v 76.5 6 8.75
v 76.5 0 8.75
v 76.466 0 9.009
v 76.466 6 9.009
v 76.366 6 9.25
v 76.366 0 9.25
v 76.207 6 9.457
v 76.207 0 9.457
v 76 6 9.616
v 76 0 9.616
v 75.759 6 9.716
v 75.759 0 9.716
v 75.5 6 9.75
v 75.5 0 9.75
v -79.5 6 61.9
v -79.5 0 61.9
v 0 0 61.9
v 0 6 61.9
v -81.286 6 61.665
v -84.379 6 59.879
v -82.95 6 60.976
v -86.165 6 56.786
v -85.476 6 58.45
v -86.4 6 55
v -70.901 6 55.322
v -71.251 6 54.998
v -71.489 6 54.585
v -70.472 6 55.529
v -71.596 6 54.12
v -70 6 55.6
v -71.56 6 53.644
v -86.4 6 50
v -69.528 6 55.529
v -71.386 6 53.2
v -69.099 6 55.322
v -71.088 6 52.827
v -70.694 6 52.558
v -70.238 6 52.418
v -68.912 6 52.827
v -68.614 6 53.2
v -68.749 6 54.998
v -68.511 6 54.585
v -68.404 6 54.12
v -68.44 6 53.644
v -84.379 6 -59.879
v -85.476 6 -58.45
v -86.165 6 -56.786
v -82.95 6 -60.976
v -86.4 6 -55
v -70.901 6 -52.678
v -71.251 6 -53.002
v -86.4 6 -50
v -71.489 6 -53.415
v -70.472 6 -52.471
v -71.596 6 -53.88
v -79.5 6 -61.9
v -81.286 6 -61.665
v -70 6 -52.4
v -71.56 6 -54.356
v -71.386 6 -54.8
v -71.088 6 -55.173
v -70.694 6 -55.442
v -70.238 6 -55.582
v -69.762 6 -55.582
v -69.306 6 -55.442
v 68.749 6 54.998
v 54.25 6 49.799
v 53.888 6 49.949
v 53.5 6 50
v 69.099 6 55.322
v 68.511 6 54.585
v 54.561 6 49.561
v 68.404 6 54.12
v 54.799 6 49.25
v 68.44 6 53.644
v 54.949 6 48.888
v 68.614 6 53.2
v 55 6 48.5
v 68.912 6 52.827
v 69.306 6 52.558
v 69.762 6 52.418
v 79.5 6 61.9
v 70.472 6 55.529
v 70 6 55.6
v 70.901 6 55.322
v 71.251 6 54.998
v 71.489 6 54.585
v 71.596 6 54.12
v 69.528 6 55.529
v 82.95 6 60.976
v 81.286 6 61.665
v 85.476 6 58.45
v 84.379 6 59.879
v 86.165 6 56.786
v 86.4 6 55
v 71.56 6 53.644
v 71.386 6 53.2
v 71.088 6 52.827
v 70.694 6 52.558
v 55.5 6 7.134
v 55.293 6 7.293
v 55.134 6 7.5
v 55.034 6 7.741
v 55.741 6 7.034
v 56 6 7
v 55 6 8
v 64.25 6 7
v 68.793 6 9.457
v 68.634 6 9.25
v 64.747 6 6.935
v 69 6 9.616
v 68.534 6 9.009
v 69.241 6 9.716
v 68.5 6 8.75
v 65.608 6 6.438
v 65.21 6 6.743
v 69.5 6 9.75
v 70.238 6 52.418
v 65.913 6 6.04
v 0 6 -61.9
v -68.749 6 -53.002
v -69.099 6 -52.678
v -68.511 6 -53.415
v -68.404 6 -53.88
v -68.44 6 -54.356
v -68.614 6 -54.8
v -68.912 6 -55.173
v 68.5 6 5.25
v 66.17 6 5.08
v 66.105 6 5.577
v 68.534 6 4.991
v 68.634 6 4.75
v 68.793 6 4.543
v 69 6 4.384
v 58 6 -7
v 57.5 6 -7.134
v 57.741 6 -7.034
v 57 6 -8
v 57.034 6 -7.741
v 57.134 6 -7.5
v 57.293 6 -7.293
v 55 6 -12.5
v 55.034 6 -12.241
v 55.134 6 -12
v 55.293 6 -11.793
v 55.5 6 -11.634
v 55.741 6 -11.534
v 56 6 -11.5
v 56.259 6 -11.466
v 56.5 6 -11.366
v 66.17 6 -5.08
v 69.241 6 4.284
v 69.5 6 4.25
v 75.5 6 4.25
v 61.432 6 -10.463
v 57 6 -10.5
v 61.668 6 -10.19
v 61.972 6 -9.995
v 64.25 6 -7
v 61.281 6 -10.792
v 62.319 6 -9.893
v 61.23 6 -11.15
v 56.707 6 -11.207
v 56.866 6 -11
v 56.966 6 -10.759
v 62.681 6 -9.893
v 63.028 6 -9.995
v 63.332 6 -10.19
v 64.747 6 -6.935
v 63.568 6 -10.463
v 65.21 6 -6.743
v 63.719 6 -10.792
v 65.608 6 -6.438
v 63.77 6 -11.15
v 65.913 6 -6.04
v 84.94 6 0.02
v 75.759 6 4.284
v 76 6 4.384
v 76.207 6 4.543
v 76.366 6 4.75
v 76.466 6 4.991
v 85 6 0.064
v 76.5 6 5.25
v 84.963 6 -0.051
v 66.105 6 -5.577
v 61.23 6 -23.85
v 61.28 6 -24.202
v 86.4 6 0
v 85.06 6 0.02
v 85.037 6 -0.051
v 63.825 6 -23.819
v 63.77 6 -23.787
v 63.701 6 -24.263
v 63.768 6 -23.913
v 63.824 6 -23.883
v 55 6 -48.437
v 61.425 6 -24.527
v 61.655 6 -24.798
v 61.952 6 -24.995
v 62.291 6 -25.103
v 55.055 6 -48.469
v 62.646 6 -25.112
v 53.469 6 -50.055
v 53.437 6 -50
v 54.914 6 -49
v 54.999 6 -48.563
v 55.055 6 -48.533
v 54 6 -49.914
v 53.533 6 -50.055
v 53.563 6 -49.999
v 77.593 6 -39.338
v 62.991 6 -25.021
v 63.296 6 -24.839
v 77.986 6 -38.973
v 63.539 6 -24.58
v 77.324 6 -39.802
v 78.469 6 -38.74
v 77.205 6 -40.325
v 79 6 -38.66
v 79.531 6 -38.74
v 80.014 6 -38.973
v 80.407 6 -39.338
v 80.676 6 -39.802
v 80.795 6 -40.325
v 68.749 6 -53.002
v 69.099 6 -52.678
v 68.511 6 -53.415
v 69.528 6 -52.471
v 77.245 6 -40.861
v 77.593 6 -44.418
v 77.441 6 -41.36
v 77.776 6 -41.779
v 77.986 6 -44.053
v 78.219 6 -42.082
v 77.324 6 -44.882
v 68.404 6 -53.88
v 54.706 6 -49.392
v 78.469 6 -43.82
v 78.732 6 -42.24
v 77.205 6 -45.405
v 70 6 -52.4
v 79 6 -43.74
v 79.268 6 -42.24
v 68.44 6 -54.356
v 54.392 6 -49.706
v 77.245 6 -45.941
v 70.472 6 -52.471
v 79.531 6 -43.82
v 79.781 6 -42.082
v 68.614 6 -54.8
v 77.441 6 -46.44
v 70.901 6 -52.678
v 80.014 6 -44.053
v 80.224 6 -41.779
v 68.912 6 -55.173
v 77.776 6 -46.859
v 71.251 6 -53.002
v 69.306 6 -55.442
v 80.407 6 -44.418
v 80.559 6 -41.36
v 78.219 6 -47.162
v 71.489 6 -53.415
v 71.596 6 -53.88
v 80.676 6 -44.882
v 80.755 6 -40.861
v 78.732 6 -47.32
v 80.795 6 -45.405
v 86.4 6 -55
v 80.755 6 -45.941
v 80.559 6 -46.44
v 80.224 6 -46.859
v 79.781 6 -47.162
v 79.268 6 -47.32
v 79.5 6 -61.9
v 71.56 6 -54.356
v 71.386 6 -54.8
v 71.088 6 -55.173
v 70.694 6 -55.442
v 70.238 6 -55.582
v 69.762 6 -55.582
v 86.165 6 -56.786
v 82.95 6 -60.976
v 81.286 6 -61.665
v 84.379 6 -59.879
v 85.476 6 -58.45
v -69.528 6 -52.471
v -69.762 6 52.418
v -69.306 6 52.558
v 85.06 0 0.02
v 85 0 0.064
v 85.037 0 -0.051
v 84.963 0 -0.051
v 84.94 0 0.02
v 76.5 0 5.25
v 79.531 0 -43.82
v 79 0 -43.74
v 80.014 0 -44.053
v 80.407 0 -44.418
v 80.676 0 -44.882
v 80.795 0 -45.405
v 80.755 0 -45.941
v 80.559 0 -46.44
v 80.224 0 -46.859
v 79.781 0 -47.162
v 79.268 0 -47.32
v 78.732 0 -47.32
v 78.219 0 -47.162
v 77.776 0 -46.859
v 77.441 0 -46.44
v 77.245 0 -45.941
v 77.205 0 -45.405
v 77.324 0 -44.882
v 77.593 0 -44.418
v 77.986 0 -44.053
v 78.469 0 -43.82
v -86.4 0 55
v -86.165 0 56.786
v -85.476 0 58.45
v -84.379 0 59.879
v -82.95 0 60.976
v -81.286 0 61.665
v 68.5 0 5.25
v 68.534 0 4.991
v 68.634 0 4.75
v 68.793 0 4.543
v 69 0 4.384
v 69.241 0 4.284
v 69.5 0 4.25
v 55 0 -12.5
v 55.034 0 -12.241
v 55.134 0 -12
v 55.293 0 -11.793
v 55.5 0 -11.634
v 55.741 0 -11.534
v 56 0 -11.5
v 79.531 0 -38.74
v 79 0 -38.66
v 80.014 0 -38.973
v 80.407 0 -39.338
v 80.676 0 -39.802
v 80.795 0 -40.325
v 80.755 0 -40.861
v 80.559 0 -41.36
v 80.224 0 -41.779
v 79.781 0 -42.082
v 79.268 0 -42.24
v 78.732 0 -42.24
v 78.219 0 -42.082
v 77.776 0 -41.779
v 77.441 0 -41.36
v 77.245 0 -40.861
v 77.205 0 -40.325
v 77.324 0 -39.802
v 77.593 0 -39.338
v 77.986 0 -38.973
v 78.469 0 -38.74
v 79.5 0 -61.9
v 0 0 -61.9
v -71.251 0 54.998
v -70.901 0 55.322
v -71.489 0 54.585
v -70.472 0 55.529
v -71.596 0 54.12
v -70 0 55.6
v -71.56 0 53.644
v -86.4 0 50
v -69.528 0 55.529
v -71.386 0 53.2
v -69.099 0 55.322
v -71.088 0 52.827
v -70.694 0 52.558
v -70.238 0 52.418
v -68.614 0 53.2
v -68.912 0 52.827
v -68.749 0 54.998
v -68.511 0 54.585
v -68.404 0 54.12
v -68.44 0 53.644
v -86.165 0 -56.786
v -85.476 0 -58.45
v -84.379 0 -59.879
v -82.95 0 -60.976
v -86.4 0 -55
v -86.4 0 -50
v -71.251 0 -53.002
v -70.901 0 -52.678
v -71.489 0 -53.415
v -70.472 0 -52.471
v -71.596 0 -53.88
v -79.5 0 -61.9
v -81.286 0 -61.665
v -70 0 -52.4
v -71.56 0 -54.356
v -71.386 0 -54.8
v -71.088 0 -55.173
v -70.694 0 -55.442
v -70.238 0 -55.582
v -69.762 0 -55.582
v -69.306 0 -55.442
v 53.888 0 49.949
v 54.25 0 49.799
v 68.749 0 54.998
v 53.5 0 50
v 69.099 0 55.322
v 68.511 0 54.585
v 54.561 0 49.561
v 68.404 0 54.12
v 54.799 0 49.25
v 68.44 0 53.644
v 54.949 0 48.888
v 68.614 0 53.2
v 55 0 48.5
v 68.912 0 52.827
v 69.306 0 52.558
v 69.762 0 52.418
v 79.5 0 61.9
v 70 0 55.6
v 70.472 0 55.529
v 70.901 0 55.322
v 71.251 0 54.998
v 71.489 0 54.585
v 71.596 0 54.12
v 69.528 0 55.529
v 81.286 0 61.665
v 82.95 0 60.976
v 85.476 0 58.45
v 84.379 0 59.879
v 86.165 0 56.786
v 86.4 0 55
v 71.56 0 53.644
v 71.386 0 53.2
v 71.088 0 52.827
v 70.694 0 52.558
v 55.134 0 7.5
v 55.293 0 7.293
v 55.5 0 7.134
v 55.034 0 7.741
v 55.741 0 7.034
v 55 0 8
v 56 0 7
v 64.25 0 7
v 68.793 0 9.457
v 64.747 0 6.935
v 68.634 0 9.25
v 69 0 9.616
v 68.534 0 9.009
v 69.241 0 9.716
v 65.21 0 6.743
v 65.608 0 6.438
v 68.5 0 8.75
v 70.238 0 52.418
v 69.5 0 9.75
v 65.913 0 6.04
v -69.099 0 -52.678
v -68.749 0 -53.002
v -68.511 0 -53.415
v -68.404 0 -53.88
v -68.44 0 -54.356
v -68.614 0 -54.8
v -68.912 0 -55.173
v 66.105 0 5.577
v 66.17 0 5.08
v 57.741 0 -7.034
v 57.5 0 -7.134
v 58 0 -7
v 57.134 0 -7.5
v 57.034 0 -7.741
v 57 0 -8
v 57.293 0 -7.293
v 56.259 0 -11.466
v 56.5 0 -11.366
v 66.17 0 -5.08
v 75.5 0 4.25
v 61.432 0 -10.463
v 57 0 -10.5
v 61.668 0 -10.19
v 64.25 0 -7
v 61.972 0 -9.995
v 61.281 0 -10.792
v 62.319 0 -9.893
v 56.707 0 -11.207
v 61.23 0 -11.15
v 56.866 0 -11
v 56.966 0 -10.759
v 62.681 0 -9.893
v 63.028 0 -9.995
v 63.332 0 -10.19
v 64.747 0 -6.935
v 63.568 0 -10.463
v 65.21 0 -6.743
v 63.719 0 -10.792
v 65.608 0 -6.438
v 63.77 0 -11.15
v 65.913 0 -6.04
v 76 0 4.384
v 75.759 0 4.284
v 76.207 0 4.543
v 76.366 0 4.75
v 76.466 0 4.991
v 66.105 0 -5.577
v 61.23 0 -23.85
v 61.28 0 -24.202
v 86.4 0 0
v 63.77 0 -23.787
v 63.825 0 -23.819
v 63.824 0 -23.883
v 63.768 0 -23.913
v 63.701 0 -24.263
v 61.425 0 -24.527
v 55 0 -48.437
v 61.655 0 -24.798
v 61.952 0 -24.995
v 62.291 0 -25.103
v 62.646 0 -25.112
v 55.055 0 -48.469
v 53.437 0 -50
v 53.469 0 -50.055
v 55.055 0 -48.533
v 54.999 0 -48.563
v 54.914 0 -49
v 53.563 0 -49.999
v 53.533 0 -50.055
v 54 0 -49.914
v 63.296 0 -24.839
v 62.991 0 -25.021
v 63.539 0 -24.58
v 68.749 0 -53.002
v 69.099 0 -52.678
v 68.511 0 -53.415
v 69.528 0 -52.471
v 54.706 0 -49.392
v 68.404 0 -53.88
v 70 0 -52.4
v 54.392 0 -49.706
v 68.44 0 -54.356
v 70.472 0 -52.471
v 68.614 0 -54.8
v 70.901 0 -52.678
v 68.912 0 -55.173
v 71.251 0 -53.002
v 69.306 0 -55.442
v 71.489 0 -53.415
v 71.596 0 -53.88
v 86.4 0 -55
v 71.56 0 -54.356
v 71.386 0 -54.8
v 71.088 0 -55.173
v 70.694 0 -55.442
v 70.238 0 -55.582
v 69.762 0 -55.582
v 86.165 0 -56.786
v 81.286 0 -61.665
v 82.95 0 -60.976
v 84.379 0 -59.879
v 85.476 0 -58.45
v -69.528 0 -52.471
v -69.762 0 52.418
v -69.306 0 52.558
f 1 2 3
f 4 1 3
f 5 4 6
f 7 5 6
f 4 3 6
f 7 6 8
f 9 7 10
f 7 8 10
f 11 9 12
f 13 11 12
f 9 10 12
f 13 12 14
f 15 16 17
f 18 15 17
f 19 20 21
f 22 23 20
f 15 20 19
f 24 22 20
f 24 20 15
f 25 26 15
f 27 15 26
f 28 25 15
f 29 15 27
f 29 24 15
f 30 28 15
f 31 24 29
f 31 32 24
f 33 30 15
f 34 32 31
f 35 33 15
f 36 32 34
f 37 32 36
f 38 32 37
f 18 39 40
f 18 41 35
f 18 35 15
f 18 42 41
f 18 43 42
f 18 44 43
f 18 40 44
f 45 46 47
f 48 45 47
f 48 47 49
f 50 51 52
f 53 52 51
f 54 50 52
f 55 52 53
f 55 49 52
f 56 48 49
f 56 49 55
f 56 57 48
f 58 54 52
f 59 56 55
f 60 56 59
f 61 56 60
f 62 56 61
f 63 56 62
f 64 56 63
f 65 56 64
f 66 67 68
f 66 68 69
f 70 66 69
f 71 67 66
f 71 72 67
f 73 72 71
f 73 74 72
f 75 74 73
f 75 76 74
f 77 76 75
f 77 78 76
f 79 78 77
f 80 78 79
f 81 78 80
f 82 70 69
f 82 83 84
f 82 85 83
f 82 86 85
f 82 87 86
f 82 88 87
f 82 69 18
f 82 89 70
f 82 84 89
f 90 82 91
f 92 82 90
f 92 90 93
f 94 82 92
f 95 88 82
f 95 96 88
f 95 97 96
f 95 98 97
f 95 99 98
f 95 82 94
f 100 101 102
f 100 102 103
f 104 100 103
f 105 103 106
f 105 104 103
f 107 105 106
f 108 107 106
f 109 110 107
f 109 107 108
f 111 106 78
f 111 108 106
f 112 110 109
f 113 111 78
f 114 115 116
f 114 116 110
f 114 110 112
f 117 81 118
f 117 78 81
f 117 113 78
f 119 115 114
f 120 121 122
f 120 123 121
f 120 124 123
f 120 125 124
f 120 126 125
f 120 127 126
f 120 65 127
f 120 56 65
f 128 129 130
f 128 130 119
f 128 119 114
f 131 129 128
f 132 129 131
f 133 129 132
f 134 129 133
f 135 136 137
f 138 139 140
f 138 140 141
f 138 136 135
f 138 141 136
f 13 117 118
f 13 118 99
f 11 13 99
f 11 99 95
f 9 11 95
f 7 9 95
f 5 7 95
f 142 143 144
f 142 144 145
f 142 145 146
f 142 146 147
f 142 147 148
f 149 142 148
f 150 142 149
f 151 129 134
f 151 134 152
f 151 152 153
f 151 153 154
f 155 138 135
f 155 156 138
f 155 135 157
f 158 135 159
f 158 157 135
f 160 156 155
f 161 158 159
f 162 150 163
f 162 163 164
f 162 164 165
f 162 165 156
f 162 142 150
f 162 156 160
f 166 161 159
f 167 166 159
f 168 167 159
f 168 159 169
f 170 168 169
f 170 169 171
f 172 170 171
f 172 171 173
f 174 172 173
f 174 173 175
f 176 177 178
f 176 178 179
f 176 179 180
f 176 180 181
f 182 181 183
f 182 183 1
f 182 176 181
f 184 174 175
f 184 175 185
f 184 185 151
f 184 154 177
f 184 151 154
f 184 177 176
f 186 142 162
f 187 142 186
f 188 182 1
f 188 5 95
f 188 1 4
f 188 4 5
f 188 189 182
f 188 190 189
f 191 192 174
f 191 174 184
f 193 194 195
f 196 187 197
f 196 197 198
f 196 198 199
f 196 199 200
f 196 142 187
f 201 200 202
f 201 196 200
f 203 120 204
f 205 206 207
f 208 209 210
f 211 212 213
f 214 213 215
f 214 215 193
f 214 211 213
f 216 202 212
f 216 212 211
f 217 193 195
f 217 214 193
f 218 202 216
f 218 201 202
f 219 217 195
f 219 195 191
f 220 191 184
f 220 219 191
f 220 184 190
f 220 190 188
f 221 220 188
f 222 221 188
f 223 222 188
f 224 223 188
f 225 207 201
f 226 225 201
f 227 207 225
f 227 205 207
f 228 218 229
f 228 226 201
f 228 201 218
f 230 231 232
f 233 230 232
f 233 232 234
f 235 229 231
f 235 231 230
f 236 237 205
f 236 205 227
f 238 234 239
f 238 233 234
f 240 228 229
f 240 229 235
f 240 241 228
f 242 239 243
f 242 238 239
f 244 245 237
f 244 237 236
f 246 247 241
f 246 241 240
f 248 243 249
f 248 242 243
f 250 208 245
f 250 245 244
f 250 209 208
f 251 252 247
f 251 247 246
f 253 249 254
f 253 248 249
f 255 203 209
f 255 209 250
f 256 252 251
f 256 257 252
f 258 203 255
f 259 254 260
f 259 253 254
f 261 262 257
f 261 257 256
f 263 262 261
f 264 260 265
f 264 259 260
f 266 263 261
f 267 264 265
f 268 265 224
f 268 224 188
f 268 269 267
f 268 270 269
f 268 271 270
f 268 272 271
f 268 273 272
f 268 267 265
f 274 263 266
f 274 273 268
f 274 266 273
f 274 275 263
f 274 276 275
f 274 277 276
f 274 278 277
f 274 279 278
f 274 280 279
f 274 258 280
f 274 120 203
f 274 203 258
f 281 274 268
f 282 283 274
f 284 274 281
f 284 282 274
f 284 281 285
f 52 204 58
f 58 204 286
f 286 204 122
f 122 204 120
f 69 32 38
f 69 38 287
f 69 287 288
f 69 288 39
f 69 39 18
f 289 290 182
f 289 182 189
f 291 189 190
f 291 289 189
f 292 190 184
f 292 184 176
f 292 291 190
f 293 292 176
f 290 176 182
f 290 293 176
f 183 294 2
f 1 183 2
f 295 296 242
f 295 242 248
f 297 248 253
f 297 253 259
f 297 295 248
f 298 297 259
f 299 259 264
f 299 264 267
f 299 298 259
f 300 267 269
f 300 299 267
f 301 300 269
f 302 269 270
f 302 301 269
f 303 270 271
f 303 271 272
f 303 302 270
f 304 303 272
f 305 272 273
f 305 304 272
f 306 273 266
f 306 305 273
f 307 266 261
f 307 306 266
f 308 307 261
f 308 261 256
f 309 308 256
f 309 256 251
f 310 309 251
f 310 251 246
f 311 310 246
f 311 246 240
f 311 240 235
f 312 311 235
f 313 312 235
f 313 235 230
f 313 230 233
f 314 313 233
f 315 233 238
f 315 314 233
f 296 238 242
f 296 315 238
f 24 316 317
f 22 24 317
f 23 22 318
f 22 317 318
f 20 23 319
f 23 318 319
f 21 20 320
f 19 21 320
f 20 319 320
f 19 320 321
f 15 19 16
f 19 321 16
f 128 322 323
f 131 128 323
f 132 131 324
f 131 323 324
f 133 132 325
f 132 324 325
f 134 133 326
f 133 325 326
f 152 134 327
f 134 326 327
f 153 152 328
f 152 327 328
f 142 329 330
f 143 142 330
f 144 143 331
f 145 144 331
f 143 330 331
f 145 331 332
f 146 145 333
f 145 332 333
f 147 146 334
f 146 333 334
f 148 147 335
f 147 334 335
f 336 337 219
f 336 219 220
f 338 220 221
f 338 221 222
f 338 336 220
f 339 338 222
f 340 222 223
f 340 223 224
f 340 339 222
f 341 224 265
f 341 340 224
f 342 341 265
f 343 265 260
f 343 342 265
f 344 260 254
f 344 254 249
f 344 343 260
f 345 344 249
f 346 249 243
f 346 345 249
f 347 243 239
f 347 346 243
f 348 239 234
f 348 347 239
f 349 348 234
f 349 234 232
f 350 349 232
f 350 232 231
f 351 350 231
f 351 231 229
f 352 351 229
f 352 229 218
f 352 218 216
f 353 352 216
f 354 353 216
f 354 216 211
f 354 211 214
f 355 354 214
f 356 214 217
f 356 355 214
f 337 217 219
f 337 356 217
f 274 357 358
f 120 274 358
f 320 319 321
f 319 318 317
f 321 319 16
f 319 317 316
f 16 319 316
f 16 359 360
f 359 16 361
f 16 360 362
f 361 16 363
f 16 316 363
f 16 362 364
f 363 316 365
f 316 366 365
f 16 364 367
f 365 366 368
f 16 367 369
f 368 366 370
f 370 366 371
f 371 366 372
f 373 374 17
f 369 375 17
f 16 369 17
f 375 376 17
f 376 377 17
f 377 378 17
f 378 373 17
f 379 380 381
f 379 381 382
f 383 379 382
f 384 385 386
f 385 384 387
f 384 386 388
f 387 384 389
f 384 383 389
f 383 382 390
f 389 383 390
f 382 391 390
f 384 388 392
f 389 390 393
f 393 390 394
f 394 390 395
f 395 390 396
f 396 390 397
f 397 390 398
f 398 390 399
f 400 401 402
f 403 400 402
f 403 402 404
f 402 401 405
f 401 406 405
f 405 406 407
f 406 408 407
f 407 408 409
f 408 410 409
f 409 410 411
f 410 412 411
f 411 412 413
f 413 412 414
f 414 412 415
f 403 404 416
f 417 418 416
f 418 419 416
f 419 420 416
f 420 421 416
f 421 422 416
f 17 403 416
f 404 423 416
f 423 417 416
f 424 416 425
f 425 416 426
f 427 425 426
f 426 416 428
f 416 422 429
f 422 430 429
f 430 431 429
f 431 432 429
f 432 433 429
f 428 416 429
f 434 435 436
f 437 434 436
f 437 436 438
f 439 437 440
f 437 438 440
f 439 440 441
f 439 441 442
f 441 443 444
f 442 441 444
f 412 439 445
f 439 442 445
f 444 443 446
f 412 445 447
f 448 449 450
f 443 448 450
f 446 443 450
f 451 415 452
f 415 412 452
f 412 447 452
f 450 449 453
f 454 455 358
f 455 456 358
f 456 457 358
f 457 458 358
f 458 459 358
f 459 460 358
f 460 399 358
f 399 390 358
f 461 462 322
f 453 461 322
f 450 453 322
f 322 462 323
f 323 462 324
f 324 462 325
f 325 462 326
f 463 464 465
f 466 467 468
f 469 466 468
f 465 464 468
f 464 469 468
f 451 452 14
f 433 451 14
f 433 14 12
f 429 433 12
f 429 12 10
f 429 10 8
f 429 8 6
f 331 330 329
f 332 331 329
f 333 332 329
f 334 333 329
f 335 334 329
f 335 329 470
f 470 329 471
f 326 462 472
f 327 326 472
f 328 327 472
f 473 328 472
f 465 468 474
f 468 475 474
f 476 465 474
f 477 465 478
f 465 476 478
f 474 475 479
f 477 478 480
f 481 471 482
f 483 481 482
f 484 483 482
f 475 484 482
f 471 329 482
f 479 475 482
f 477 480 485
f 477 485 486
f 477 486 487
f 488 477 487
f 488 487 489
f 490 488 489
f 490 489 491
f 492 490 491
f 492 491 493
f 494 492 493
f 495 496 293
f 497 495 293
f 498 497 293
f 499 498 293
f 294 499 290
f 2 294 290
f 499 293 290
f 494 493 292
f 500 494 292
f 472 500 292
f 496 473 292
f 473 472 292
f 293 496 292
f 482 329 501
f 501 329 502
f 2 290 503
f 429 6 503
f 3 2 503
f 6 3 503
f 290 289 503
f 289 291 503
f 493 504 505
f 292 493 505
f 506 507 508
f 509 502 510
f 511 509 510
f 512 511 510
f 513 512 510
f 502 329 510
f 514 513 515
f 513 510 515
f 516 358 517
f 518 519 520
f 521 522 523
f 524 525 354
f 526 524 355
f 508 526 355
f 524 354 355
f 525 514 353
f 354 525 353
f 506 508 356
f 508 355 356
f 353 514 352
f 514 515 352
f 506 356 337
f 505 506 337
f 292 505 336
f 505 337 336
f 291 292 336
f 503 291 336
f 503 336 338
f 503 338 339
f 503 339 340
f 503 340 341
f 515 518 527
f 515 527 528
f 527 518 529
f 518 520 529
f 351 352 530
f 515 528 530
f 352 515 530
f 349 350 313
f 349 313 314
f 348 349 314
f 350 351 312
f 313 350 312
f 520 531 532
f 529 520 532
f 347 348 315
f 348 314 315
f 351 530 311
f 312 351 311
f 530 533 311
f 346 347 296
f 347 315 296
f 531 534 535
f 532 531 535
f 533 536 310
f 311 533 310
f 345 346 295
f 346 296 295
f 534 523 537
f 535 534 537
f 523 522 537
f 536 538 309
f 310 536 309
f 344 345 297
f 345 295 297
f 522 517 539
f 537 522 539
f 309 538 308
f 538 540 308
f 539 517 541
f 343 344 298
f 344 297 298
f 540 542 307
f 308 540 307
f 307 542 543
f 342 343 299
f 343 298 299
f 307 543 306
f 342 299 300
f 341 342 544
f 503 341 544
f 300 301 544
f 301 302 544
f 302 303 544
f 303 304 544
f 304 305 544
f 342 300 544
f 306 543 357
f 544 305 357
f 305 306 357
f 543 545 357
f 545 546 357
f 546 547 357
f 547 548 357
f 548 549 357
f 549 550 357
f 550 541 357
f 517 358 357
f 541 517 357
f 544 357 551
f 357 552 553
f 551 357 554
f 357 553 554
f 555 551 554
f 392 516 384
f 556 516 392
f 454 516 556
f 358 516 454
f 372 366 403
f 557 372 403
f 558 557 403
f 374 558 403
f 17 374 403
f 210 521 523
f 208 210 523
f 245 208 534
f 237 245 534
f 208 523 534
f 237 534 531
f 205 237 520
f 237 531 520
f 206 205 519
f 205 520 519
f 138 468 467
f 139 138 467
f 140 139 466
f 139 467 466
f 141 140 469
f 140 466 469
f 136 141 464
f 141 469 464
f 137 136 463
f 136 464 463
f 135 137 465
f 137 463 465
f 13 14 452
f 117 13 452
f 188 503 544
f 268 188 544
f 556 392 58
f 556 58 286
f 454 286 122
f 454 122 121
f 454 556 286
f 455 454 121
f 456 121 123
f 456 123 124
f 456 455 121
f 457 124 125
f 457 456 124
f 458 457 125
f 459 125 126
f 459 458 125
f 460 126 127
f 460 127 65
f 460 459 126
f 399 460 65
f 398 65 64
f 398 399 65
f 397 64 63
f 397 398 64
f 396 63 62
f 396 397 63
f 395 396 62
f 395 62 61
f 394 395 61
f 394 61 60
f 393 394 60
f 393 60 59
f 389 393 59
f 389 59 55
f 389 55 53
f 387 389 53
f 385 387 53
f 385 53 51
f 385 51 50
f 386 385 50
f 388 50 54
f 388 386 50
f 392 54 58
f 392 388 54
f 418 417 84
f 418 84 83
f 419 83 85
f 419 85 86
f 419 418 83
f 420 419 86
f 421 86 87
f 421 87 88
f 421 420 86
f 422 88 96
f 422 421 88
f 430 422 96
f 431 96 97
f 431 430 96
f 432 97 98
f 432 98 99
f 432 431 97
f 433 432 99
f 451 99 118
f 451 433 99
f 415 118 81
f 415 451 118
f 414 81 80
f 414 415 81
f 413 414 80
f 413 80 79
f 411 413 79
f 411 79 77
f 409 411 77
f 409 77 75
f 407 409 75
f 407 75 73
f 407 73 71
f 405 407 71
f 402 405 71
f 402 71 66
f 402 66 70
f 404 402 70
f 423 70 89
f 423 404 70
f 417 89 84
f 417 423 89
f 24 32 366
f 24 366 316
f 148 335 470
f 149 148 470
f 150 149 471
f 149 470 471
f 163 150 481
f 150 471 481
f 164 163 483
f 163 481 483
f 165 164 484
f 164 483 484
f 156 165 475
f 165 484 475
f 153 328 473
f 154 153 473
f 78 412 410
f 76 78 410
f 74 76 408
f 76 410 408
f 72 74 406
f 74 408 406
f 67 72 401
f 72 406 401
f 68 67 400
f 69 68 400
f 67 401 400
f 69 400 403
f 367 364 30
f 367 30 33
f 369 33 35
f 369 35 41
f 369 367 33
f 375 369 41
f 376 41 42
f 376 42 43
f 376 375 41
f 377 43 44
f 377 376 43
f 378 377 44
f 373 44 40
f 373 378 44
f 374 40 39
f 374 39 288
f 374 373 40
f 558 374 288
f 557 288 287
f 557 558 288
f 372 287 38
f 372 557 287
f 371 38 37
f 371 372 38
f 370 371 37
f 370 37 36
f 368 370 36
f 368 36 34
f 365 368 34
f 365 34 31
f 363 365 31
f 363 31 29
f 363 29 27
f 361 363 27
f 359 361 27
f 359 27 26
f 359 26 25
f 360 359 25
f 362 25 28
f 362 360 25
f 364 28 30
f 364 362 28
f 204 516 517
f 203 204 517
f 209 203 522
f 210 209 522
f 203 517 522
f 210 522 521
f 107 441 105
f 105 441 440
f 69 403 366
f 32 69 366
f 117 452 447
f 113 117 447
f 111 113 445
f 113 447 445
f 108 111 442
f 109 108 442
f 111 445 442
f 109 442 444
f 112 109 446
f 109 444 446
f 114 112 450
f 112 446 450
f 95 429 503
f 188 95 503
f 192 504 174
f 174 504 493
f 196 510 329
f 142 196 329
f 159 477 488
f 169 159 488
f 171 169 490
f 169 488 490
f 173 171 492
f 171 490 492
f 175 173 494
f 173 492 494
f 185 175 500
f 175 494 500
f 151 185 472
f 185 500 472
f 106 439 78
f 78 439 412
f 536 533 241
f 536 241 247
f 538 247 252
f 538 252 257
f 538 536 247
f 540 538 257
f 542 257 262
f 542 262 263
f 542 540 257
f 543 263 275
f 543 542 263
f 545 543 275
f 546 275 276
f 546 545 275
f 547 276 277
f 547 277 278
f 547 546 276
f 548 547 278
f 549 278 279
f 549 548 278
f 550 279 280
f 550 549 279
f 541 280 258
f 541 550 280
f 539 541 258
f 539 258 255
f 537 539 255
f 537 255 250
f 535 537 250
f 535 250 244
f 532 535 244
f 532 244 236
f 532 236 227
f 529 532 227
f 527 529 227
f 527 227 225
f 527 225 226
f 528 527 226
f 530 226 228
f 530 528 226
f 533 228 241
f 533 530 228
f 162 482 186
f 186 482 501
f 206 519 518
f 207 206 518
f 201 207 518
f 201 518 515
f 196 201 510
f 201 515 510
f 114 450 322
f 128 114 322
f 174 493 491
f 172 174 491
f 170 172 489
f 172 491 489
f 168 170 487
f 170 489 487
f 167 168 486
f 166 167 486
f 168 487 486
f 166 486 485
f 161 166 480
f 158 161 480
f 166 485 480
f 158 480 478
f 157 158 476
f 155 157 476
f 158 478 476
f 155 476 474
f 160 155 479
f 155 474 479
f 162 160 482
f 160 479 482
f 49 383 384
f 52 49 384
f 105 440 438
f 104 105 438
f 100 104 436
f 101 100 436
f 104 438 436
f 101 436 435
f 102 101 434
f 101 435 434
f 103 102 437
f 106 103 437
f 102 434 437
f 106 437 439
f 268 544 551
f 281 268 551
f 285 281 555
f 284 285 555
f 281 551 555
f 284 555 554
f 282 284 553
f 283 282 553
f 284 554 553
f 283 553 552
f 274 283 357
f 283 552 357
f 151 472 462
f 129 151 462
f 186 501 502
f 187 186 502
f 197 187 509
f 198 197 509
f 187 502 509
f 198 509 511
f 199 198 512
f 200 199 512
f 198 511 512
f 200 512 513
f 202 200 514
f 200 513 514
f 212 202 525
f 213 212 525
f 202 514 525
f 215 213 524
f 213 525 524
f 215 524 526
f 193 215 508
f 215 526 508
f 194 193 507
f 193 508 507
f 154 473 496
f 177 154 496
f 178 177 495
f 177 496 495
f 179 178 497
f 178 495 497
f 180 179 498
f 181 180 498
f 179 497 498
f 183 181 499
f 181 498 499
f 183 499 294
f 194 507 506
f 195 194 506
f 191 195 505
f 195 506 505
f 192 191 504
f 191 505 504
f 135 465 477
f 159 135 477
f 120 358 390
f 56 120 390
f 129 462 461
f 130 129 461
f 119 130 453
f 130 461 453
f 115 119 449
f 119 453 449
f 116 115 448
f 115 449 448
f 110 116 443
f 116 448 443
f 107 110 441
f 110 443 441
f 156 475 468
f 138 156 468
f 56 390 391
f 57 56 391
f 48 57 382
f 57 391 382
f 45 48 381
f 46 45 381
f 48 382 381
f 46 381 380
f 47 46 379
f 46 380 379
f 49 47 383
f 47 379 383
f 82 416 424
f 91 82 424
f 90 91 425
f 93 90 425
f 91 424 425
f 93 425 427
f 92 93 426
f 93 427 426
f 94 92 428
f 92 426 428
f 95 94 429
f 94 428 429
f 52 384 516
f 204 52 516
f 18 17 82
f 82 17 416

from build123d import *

# Parameters (mm, degrees)
SKIZZE1_R                       = 0.0635
SKIZZE1_R_2                     = 1.59999934
SKIZZE1_R_3                     = 1.79999894
AUFSATZ_LINEAR_AUSTRAGEN1_DEPTH = 6


with BuildPart() as part:
    # Skizze1 → Aufsatz-Linear austragen1 (new body)
    with BuildSketch(Plane(origin=(0, 0, 0), x_dir=(1, 0, 0), z_dir=(0, 1, 0))):
        with BuildLine():
            Line((-86.39999891, 50.00000287), (53.43650095, 50.00000287))
            ThreePointArc((53.43650095, 50.00000287), (53.50067303, 50.063499313), (53.563486724, 49.998658786))
            ThreePointArc((53.563486724, 49.998658786), (54.560660834, 49.560663139), (54.998656411, 48.563488998))
            ThreePointArc((54.998656411, 48.563488998), (55.063496933, 48.500675299), (55.000000486, 48.436503224))
            Line((55.000000486, 48.436503224), (54.99999795, 12.500004281))
            ThreePointArc((54.99999795, 12.500004281), (55.292891674, 11.792896174), (55.99999976, 11.5000024))
            ThreePointArc((55.99999976, 11.5000024), (56.707106025, 11.207109395), (56.99999903, 10.50000313))
            Line((56.99999903, 10.50000313), (56.99999903, 8.00000305))
            ThreePointArc((56.99999903, 8.00000305), (57.292892407, 7.292895887), (57.99999957, 7.00000251))
            Line((57.99999957, 7.00000251), (64.24999977, 7.00000251))
            ThreePointArc((64.24999977, 7.00000251), (65.607645667, 6.437647167), (66.17000101, 5.08000127))
            Line((66.17000101, 5.08000127), (66.17000101, -5.07999873))
            ThreePointArc((66.17000101, -5.07999873), (65.607645667, -6.437644627), (64.24999977, -6.99999997))
            Line((64.24999977, -6.99999997), (55.99999849, -6.99999997))
            ThreePointArc((55.99999849, -6.99999997), (55.292892225, -7.292892975), (54.99999922, -7.99999924))
            Line((54.99999922, -7.99999924), (54.99999922, -48.49999952))
            ThreePointArc((54.99999922, -48.49999952), (54.560659527, -49.560659367), (53.49999968, -49.99999906))
            Line((53.49999968, -49.99999906), (-86.40000018, -49.99999906))
            Line((-86.40000018, -49.99999906), (-86.40000018, -54.99999922))
            ThreePointArc((-86.40000018, -54.99999922), (-84.379038194, -59.879033386), (-79.500004221, -61.89999584))
            Line((-79.500004221, -61.89999584), (-5.627e-06, -61.90000346))
            Line((-5.627e-06, -61.90000346), (79.499999141, -61.89999584))
            ThreePointArc((79.499999141, -61.89999584), (84.379034125, -59.879032902), (86.39999637, -54.999997631))
            Line((86.39999637, -54.999997631), (86.39999383, -1.1416e-05))
            Line((86.39999383, -1.1416e-05), (86.39999637, 55.00000049))
            ThreePointArc((86.39999637, 55.00000049), (84.379034012, 59.879035554), (79.499999141, 61.89999838))
            Line((79.499999141, 61.89999838), (0.000118912, 61.900006))
            Line((0.000118912, 61.900006), (-79.50000356, 61.89999838))
            ThreePointArc((-79.50000356, 61.89999838), (-84.379040097, 59.879034549), (-86.40000145, 54.999996985))
            Line((-86.40000145, 54.999996985), (-86.39999891, 50.00000287))
        make_face()
        with Locations(Location((84.99999383, -1.1351e-05, 0), (0, 0, 270))):
            Circle(SKIZZE1_R, mode=Mode.SUBTRACT)
        with BuildLine():
            Line((68.50000016, -8.75000282), (68.50000016, -5.24999966))
            ThreePointArc((68.50000016, -5.24999966), (68.792893537, -4.542892497), (69.5000007, -4.24999912))
            Line((69.5000007, -4.24999912), (75.49999886, -4.24999912))
            ThreePointArc((75.49999886, -4.24999912), (76.207106023, -4.542892497), (76.4999994, -5.24999966))
            Line((76.4999994, -5.24999966), (76.4999994, -8.75000282))
            ThreePointArc((76.4999994, -8.75000282), (76.207106023, -9.457109983), (75.49999886, -9.75000336))
            Line((75.49999886, -9.75000336), (69.5000007, -9.75000336))
            ThreePointArc((69.5000007, -9.75000336), (68.792893537, -9.457109983), (68.50000016, -8.75000282))
        make_face(mode=Mode.SUBTRACT)
        with Locations(Location((-69.9999997, 54.00000122, 0), (0, 0, 270))):
            Circle(SKIZZE1_R_2, mode=Mode.SUBTRACT)
        with BuildLine():
            Line((63.76999946, 23.78650056), (63.76999946, 11.15000056))
            ThreePointArc((63.76999946, 11.15000056), (62.49999946, 9.88000056), (61.22999946, 11.15000056))
            Line((61.22999946, 11.15000056), (61.22999946, 23.85000056))
            ThreePointArc((61.22999946, 23.85000056), (62.46824946, 25.119603623), (63.76841196, 23.913480713))
            ThreePointArc((63.76841196, 23.913480713), (63.833494498, 23.850794372), (63.76999946, 23.78650056))
        make_face(mode=Mode.SUBTRACT)
        with Locations(Location((78.99999948, 40.46000036, 0), (0, 0, 270))):
            Circle(SKIZZE1_R_3, mode=Mode.SUBTRACT)
        with Locations(Location((78.99999948, 45.54000036, 0), (0, 0, 270))):
            Circle(SKIZZE1_R_3, mode=Mode.SUBTRACT)
        with Locations(Location((69.9999997, 54.00000122, 0), (0, 0, 270))):
            Circle(SKIZZE1_R_2, mode=Mode.SUBTRACT)
        with Locations(Location((-69.9999997, -54.00000122, 0), (0, 0, 270))):
            Circle(SKIZZE1_R_2, mode=Mode.SUBTRACT)
        with Locations(Location((69.9999997, -54.00000122, 0), (0, 0, 270))):
            Circle(SKIZZE1_R_2, mode=Mode.SUBTRACT)
    extrude(amount=AUFSATZ_LINEAR_AUSTRAGEN1_DEPTH)


solid = part.part
